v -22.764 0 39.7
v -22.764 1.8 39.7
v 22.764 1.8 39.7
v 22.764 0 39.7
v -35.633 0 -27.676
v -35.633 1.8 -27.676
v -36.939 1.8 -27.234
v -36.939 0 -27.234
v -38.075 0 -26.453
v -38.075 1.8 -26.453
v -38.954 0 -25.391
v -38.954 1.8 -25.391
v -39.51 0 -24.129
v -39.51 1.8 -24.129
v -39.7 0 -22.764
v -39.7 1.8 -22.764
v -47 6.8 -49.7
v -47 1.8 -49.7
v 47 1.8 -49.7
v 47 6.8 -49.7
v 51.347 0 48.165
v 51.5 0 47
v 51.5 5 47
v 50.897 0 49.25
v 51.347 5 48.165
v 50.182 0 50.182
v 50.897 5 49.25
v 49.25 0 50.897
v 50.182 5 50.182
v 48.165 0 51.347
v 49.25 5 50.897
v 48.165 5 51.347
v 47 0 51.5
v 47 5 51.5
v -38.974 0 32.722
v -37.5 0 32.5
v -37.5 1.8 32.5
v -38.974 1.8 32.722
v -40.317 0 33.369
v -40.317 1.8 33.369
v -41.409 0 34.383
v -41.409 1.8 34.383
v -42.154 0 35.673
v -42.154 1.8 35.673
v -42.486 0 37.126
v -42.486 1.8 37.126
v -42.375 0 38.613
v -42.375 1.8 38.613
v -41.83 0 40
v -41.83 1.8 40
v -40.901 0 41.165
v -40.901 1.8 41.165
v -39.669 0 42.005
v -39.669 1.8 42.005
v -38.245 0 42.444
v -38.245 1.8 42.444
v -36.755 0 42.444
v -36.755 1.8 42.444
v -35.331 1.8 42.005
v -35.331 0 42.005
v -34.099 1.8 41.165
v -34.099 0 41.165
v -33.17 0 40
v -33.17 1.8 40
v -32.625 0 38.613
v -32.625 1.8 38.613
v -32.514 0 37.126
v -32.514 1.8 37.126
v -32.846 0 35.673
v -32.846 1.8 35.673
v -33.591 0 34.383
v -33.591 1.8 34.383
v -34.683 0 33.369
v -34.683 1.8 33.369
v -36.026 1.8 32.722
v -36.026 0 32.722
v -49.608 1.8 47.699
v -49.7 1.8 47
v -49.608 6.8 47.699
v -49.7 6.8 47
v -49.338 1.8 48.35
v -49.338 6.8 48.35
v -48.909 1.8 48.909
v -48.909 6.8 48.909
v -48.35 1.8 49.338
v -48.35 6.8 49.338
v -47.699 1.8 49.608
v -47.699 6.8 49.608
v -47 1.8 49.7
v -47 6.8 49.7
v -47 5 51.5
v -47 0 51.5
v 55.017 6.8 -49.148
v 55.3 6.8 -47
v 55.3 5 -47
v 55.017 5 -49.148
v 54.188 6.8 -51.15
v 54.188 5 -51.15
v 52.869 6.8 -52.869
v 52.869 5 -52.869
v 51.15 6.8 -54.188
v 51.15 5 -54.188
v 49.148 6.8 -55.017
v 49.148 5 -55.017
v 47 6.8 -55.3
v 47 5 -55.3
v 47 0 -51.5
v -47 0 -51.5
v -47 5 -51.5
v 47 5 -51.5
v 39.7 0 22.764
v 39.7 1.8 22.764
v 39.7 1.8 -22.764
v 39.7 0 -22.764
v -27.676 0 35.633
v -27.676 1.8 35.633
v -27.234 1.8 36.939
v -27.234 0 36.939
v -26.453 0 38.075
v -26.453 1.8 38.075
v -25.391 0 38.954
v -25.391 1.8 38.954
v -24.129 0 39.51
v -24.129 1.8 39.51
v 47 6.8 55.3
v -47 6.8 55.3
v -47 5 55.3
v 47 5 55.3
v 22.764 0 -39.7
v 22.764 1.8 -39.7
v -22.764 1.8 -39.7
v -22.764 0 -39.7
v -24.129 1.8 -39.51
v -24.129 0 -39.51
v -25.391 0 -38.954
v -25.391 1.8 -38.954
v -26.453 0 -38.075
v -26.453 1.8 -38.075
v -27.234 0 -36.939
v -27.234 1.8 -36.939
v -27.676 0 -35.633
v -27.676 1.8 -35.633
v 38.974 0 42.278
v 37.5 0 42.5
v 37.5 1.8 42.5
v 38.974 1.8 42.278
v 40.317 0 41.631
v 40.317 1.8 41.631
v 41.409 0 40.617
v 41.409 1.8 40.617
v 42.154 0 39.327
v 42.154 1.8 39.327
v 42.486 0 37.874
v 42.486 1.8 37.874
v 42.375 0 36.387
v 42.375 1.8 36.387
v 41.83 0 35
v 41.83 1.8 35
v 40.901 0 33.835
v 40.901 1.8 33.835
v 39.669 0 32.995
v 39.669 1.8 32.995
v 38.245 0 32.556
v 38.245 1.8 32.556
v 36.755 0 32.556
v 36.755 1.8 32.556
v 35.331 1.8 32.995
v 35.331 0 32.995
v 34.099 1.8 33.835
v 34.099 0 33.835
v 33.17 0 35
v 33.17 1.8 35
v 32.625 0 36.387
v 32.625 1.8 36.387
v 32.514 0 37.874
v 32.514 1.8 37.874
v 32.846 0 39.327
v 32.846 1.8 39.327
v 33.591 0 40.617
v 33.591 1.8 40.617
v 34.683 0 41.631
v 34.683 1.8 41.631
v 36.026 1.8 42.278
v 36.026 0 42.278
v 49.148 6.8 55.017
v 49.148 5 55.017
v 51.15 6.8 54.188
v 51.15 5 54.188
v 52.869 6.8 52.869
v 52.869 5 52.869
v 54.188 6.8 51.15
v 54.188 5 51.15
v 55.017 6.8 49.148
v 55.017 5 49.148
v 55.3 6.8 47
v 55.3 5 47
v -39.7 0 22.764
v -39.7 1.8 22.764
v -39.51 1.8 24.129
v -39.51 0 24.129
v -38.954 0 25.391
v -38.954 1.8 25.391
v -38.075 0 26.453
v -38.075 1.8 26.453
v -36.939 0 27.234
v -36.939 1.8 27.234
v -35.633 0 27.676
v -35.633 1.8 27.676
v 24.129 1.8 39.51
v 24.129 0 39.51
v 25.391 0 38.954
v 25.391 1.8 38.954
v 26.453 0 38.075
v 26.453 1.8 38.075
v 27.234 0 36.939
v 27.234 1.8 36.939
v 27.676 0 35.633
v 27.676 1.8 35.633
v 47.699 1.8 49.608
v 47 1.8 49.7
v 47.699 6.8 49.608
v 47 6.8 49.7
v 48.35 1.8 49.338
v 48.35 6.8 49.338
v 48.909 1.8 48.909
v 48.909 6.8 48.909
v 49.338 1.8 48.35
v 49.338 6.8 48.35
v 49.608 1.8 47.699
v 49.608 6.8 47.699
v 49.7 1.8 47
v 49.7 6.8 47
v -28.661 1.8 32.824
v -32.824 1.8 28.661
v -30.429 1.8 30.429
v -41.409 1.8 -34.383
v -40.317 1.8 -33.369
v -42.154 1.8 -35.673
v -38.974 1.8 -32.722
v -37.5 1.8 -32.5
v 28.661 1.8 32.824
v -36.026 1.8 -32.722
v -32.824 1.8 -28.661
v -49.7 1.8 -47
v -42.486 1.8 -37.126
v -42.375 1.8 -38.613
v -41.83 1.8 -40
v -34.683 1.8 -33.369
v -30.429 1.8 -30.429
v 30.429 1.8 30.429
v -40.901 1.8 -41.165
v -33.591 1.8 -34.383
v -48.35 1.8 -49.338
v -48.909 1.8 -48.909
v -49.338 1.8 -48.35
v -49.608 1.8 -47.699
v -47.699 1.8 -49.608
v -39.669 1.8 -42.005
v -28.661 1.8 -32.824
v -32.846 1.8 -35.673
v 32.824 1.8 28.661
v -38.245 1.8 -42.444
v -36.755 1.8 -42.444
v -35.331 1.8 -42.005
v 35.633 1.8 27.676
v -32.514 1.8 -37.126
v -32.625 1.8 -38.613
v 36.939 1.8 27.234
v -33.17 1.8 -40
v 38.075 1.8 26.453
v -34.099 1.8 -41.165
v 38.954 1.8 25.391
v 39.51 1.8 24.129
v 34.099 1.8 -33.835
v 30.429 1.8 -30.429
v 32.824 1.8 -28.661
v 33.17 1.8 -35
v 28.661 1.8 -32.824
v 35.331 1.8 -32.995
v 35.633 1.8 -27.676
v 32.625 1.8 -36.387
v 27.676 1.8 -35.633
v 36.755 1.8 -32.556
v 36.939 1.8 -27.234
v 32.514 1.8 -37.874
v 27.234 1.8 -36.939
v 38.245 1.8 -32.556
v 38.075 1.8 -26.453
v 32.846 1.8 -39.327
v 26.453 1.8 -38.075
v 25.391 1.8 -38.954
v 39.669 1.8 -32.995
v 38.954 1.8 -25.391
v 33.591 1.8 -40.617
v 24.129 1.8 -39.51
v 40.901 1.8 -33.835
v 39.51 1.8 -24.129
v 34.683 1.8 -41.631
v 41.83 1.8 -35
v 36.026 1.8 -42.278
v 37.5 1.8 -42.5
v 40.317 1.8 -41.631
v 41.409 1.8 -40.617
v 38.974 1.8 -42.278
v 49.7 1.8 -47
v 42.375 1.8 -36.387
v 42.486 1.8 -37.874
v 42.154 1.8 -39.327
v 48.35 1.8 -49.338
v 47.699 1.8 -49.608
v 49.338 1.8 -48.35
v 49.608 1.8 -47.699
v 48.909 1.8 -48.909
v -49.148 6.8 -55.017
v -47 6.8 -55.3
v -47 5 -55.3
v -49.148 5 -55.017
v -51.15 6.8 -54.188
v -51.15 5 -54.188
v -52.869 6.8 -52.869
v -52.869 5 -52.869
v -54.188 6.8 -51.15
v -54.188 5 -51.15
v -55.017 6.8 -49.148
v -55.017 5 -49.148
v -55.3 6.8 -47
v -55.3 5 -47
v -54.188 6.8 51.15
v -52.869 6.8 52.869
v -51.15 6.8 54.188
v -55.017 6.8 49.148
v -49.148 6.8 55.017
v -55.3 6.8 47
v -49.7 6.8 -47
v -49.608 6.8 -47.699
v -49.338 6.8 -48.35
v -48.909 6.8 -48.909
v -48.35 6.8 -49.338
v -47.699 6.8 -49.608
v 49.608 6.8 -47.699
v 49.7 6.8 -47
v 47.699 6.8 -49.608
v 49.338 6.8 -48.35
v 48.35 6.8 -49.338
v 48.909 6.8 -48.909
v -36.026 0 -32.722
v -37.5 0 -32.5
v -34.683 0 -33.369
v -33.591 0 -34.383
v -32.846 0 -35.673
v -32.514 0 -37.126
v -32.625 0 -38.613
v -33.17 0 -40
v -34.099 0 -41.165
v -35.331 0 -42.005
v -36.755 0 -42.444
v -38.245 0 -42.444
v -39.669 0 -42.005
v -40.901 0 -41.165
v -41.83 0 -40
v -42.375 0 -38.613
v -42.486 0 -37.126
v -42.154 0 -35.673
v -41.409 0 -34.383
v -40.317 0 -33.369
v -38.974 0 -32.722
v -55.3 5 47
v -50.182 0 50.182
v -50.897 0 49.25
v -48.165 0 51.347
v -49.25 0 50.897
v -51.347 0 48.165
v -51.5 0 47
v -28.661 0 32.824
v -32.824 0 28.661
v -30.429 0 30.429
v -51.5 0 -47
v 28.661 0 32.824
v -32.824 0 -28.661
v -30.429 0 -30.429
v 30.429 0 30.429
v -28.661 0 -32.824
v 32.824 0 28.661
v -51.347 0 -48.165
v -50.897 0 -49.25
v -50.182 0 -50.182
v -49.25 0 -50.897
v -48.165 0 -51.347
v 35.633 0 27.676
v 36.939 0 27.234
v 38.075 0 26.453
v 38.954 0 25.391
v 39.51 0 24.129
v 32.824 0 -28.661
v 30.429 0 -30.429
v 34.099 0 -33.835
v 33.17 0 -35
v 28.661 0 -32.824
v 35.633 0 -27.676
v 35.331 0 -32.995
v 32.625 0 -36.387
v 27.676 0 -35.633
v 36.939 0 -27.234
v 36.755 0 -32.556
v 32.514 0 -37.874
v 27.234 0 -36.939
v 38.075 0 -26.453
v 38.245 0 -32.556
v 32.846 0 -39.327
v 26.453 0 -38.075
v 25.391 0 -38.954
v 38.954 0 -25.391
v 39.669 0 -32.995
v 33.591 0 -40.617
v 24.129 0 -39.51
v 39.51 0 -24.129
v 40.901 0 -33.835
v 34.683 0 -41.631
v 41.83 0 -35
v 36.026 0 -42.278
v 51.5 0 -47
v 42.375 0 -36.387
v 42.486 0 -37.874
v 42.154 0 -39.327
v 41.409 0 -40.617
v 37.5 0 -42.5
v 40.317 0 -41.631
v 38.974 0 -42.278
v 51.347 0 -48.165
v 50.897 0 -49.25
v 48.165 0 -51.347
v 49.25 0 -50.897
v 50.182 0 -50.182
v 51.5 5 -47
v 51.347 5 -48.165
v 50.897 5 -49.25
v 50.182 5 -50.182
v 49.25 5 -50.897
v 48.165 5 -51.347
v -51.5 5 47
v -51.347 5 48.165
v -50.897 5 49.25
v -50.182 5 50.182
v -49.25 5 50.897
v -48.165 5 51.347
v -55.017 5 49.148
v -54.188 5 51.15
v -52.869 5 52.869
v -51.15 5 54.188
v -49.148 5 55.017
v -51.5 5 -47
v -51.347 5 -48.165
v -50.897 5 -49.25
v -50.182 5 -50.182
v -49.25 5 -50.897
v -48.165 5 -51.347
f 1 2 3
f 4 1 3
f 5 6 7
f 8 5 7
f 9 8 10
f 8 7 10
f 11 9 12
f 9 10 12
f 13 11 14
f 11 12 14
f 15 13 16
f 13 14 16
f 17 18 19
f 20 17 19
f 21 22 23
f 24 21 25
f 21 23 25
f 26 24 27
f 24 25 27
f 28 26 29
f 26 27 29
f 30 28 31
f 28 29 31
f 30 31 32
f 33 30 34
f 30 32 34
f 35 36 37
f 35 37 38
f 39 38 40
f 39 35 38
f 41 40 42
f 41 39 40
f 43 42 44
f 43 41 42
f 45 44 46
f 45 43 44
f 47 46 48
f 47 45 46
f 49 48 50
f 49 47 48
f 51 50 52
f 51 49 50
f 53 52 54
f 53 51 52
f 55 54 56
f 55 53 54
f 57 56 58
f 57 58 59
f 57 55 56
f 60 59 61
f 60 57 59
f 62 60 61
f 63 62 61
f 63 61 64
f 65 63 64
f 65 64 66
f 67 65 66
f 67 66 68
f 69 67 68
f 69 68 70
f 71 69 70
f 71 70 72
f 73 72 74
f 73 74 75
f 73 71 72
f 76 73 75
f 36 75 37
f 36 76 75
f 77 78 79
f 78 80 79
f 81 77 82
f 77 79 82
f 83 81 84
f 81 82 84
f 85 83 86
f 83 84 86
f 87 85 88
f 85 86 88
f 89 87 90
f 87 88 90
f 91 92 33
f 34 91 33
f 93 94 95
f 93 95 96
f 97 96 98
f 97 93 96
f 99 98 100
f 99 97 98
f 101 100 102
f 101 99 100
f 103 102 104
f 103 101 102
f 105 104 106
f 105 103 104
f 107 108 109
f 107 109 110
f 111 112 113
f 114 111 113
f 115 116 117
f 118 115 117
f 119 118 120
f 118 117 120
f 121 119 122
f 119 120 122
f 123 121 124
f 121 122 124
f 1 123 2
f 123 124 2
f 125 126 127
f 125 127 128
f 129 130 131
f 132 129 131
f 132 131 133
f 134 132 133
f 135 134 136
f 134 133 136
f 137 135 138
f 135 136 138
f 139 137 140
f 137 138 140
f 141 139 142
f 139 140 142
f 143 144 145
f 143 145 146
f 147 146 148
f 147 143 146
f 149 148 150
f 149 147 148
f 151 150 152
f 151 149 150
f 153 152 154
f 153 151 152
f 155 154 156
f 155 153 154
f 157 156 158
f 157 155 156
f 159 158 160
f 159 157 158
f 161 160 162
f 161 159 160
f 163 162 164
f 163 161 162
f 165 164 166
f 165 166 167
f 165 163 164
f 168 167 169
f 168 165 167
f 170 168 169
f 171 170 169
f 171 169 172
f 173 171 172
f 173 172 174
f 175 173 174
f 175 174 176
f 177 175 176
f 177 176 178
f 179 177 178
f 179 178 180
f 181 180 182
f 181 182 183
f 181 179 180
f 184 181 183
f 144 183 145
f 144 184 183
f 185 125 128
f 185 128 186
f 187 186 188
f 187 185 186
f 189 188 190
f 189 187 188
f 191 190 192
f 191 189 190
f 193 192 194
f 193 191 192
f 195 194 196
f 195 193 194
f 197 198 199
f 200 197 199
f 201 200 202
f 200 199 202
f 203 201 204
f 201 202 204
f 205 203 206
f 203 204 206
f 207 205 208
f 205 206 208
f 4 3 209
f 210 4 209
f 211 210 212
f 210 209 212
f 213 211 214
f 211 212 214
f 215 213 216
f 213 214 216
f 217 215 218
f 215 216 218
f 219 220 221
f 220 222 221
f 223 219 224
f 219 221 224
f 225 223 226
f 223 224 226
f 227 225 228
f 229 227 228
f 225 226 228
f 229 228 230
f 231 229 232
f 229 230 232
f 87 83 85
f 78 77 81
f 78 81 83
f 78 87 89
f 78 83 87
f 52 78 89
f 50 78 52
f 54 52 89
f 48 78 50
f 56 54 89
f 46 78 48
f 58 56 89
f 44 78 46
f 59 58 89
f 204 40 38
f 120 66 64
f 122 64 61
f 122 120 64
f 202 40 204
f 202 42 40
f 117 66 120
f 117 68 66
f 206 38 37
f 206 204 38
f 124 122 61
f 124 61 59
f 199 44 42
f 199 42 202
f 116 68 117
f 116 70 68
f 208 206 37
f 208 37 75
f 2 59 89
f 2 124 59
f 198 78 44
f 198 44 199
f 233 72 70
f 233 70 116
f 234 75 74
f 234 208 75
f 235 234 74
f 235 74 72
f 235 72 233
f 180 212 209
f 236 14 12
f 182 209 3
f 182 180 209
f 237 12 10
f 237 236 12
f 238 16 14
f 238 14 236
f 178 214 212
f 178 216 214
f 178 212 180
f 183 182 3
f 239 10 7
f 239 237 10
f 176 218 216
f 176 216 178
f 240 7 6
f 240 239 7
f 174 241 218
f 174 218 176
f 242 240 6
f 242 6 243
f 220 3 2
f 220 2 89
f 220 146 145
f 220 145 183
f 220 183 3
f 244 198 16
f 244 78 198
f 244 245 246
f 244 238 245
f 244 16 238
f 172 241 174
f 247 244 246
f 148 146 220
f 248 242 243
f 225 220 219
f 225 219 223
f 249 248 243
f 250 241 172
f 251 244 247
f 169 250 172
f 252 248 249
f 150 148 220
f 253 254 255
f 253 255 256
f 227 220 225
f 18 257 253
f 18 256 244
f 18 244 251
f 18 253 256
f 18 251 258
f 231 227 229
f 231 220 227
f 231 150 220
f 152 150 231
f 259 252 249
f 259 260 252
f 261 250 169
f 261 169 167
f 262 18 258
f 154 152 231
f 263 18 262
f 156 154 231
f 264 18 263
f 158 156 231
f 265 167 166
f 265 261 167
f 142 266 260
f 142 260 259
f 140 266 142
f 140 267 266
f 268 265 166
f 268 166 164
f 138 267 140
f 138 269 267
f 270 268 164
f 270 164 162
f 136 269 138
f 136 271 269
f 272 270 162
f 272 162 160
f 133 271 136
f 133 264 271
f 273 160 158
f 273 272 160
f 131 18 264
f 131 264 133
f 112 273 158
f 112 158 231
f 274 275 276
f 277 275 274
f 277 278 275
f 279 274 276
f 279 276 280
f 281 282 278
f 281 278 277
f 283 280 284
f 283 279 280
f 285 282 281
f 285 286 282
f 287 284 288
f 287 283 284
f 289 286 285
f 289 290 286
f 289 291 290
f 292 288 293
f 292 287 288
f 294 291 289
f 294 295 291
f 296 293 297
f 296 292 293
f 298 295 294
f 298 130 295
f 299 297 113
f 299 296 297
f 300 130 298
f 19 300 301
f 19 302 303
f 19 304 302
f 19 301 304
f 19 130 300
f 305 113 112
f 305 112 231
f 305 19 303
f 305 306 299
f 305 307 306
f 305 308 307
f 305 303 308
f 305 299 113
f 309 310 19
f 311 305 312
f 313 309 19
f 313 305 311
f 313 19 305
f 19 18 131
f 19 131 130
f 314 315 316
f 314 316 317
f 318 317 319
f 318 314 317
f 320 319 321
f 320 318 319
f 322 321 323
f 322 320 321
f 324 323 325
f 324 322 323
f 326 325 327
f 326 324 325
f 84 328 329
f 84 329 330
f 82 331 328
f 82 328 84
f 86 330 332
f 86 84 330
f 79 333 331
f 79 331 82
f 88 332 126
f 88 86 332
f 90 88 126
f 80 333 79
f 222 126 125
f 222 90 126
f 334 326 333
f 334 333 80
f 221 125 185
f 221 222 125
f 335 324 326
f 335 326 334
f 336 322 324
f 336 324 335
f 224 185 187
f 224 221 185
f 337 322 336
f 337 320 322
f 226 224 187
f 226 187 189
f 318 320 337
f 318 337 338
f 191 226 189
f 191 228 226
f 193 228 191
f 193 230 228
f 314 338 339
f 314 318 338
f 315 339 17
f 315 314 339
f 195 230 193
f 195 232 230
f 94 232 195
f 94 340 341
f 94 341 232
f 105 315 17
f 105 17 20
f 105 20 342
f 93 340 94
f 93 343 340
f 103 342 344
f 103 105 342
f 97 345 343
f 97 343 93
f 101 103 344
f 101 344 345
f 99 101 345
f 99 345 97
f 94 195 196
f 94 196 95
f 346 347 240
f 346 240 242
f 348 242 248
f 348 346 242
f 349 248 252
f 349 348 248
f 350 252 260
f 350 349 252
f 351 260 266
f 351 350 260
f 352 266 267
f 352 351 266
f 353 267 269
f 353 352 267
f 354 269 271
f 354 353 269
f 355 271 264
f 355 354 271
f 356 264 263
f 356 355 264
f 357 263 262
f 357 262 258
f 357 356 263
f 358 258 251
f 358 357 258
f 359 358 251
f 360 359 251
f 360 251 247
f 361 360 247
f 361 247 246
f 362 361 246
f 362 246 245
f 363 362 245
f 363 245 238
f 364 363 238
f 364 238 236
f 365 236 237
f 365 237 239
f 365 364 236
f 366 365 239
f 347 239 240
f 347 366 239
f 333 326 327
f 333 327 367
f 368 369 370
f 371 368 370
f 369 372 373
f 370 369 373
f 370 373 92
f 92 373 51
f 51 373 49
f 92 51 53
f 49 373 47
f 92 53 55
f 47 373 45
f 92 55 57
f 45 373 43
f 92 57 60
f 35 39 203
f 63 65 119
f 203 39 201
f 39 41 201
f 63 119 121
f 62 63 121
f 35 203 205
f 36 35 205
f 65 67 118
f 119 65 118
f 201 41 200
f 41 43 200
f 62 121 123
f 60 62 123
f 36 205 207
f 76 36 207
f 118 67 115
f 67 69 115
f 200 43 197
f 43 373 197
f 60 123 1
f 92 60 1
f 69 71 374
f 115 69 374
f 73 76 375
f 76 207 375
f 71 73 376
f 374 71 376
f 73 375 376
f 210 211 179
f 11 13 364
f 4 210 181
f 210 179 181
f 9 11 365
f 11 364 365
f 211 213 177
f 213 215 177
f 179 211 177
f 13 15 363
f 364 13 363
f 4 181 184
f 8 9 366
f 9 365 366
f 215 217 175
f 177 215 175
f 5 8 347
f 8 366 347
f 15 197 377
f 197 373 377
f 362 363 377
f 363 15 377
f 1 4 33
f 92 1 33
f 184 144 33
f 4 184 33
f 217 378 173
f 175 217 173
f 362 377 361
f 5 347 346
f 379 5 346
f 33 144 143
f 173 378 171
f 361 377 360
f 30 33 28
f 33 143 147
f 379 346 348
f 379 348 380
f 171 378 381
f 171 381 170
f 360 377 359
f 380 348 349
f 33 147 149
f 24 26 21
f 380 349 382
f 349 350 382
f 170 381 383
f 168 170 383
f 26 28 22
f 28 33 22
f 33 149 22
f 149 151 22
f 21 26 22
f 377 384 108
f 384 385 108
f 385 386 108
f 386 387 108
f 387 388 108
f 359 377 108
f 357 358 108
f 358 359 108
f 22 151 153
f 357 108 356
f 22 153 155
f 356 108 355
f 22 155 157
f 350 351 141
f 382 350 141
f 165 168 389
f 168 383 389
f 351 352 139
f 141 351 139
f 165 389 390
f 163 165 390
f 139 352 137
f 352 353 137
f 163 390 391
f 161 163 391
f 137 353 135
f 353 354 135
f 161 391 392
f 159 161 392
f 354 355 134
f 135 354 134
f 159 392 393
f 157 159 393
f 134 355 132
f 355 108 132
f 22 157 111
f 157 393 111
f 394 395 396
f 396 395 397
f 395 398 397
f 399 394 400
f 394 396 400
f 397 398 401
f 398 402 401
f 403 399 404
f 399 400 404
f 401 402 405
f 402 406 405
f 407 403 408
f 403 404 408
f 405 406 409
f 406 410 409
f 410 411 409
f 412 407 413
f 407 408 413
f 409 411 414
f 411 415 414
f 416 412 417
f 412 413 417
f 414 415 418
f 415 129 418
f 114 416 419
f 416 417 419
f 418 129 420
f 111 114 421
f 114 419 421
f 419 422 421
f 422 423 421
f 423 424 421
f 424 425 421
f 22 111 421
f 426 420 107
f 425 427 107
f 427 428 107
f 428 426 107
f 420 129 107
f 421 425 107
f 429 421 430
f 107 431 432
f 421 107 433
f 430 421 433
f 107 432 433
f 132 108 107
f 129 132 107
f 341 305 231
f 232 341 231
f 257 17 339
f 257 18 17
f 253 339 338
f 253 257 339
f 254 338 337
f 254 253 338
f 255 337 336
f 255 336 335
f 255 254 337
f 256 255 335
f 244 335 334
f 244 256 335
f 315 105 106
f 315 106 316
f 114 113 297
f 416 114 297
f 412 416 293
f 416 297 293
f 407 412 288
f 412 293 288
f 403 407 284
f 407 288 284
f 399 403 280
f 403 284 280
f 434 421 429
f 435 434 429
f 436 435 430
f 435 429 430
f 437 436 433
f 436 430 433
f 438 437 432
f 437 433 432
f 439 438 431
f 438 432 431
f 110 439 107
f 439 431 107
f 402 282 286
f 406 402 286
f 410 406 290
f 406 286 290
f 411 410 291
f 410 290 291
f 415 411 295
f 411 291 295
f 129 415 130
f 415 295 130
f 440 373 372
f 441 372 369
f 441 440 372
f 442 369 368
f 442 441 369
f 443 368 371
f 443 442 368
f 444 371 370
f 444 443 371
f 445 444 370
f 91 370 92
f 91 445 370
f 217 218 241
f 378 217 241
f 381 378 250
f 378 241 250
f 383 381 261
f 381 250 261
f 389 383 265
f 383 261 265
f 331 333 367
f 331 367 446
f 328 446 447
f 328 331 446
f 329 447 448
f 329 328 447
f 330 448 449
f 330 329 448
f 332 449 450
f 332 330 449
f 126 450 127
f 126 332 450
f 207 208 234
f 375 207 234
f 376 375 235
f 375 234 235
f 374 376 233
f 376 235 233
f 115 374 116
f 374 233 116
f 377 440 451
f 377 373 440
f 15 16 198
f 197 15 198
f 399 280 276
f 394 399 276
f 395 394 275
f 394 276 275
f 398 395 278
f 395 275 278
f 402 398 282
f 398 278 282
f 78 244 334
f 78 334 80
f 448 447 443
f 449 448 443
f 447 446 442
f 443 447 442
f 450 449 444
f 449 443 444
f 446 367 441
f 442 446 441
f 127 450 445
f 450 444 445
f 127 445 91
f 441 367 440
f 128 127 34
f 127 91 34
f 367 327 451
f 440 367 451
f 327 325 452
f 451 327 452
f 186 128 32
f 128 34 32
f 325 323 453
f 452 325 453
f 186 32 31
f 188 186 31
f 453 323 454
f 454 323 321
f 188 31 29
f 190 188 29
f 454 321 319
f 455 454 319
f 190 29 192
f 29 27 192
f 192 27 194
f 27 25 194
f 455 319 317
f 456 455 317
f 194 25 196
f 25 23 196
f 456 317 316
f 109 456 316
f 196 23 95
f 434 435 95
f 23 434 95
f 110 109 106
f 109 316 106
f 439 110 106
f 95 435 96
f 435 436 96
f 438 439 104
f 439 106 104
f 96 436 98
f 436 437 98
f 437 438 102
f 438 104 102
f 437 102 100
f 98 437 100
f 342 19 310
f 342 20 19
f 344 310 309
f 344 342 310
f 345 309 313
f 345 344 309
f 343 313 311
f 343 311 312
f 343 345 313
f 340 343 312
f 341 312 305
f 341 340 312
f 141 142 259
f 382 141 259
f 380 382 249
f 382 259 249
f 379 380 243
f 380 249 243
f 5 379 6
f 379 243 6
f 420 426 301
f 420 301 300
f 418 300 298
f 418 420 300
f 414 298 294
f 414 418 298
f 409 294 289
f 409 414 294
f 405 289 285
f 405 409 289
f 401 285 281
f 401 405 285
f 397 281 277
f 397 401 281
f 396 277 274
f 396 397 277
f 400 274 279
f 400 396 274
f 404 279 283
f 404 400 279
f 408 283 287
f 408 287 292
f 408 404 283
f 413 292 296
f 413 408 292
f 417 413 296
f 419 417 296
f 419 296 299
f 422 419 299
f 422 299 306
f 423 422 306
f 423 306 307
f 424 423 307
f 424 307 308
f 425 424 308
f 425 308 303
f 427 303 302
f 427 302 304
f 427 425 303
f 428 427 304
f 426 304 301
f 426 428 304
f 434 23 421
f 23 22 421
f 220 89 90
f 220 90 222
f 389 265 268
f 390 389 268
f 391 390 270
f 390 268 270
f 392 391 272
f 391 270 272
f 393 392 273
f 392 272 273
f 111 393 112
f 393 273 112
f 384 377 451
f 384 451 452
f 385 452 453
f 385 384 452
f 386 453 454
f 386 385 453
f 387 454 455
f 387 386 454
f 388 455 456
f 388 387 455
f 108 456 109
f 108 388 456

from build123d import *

# Parameters (mm, degrees)
SKETCH1_W           = 103
SKETCH1_H           = 103
SKETCH1_R           = 5
BOSS_EXTRUDE1_DEPTH = 1.8
SKETCH2_W           = 103
SKETCH2_H           = 103
SKETCH2_W_2         = 99.4
SKETCH2_H_2         = 99.4
BOSS_EXTRUDE2_DEPTH = 6.8
FILLET1_R           = 4.5
SKETCH3_W           = 99.4
SKETCH3_H           = 99.4
BOSS_EXTRUDE3_DEPTH = 1.8
FILLET3_R           = 2.7
CUT_EXTRUDE2_DEPTH  = 79.365681264


with BuildPart() as part:
    # Sketch1 → Boss-Extrude1 (new body)
    with BuildSketch(Plane(origin=(0, 0, 0), x_dir=(1, 0, 0), z_dir=(0, 1, 0))):
        Rectangle(SKETCH1_W, SKETCH1_H)
        with Locations(Location((-37.5, 37.5, 0), (0, 0, 270))):
            Circle(SKETCH1_R, mode=Mode.SUBTRACT)
        with Locations(Location((37.5, 37.5, 0), (0, 0, 90))):
            Circle(SKETCH1_R, mode=Mode.SUBTRACT)
        with Locations(Location((37.5, -37.5, 0), (0, 0, 270))):
            Circle(SKETCH1_R, mode=Mode.SUBTRACT)
        with Locations(Location((-37.5, -37.5, 0), (0, 0, 90))):
            Circle(SKETCH1_R, mode=Mode.SUBTRACT)
    extrude(amount=BOSS_EXTRUDE1_DEPTH)

    # Sketch2 → Boss-Extrude2 (add)
    with BuildSketch(Plane.XZ):
        Rectangle(SKETCH2_W, SKETCH2_H)
        Rectangle(SKETCH2_W_2, SKETCH2_H_2, mode=Mode.SUBTRACT)
    extrude(amount=-BOSS_EXTRUDE2_DEPTH)

    # Fillet1
    fillet1_edges = [part.edges().sort_by_distance(p)[0] for p in [
        (51.5, 3.4, 51.5),
        (-51.5, 3.4, 51.5),
        (-51.5, 3.4, -51.5),
        (51.5, 3.4, -51.5),
    ]]
    fillet(fillet1_edges, radius=FILLET1_R)

    # Sketch3 → Boss-Extrude3 (add)
    with BuildSketch(Plane(origin=(0, 6.8, 0), x_dir=(1, 0, 0), z_dir=(0, 1, 0))):
        with BuildLine():
            Line((47, 55.3), (-47, 55.3))
            ThreePointArc((-47, 55.3), (-52.868986284, 52.868986284), (-55.3, 47))
            Line((-55.3, 47), (-55.3, -47))
            ThreePointArc((-55.3, -47), (-52.868986284, -52.868986284), (-47, -55.3))
            Line((-47, -55.3), (47, -55.3))
            ThreePointArc((47, -55.3), (52.868986284, -52.868986284), (55.3, -47))
            Line((55.3, -47), (55.3, 47))
            ThreePointArc((55.3, 47), (52.868986284, 52.868986284), (47, 55.3))
        make_face()
        Rectangle(SKETCH3_W, SKETCH3_H, mode=Mode.SUBTRACT)
    extrude(amount=-BOSS_EXTRUDE3_DEPTH)

    # Fillet3
    fillet3_edges = [part.edges().sort_by_distance(p)[0] for p in [
        (-49.7, 4.3, 49.7),
        (-49.7, 4.3, -49.7),
        (49.7, 4.3, -49.7),
        (49.7, 4.3, 49.7),
    ]]
    fillet(fillet3_edges, radius=FILLET3_R)

    # Sketch5 → Cut-Extrude2 (cut, through all)
    with BuildSketch(Plane(origin=(0, 1.8, 0), x_dir=(1, 0, 0), z_dir=(0, 1, 0))):
        with BuildLine():
            Line((22.763650384, 39.7), (-22.763650384, 39.7))
            ThreePointArc((-22.763650384, 39.7), (-25.952171462, 38.551406669), (-27.675766923, 35.633333333))
            ThreePointArc((-27.675766923, 35.633333333), (-30.428932188, 30.428932188), (-35.633333333, 27.675766923))
            ThreePointArc((-35.633333333, 27.675766923), (-38.551406669, 25.952171462), (-39.7, 22.763650384))
            Line((-39.7, 22.763650384), (-39.7, -22.763650384))
            ThreePointArc((-39.7, -22.763650384), (-38.551406669, -25.952171462), (-35.633333333, -27.675766923))
            ThreePointArc((-35.633333333, -27.675766923), (-30.428932188, -30.428932188), (-27.675766923, -35.633333333))
            ThreePointArc((-27.675766923, -35.633333333), (-25.952171462, -38.551406669), (-22.763650384, -39.7))
            Line((-22.763650384, -39.7), (22.763650384, -39.7))
            ThreePointArc((22.763650384, -39.7), (25.952171462, -38.551406669), (27.675766923, -35.633333333))
            ThreePointArc((27.675766923, -35.633333333), (30.428932188, -30.428932188), (35.633333333, -27.675766923))
            ThreePointArc((35.633333333, -27.675766923), (38.551406669, -25.952171462), (39.7, -22.763650384))
            Line((39.7, -22.763650384), (39.7, 22.763650384))
            ThreePointArc((39.7, 22.763650384), (38.551406669, 25.952171462), (35.633333333, 27.675766923))
            ThreePointArc((35.633333333, 27.675766923), (30.428932188, 30.428932188), (27.675766923, 35.633333333))
            ThreePointArc((27.675766923, 35.633333333), (25.952171462, 38.551406669), (22.763650384, 39.7))
        make_face()
    extrude(amount=-CUT_EXTRUDE2_DEPTH, mode=Mode.SUBTRACT)


solid = part.part
